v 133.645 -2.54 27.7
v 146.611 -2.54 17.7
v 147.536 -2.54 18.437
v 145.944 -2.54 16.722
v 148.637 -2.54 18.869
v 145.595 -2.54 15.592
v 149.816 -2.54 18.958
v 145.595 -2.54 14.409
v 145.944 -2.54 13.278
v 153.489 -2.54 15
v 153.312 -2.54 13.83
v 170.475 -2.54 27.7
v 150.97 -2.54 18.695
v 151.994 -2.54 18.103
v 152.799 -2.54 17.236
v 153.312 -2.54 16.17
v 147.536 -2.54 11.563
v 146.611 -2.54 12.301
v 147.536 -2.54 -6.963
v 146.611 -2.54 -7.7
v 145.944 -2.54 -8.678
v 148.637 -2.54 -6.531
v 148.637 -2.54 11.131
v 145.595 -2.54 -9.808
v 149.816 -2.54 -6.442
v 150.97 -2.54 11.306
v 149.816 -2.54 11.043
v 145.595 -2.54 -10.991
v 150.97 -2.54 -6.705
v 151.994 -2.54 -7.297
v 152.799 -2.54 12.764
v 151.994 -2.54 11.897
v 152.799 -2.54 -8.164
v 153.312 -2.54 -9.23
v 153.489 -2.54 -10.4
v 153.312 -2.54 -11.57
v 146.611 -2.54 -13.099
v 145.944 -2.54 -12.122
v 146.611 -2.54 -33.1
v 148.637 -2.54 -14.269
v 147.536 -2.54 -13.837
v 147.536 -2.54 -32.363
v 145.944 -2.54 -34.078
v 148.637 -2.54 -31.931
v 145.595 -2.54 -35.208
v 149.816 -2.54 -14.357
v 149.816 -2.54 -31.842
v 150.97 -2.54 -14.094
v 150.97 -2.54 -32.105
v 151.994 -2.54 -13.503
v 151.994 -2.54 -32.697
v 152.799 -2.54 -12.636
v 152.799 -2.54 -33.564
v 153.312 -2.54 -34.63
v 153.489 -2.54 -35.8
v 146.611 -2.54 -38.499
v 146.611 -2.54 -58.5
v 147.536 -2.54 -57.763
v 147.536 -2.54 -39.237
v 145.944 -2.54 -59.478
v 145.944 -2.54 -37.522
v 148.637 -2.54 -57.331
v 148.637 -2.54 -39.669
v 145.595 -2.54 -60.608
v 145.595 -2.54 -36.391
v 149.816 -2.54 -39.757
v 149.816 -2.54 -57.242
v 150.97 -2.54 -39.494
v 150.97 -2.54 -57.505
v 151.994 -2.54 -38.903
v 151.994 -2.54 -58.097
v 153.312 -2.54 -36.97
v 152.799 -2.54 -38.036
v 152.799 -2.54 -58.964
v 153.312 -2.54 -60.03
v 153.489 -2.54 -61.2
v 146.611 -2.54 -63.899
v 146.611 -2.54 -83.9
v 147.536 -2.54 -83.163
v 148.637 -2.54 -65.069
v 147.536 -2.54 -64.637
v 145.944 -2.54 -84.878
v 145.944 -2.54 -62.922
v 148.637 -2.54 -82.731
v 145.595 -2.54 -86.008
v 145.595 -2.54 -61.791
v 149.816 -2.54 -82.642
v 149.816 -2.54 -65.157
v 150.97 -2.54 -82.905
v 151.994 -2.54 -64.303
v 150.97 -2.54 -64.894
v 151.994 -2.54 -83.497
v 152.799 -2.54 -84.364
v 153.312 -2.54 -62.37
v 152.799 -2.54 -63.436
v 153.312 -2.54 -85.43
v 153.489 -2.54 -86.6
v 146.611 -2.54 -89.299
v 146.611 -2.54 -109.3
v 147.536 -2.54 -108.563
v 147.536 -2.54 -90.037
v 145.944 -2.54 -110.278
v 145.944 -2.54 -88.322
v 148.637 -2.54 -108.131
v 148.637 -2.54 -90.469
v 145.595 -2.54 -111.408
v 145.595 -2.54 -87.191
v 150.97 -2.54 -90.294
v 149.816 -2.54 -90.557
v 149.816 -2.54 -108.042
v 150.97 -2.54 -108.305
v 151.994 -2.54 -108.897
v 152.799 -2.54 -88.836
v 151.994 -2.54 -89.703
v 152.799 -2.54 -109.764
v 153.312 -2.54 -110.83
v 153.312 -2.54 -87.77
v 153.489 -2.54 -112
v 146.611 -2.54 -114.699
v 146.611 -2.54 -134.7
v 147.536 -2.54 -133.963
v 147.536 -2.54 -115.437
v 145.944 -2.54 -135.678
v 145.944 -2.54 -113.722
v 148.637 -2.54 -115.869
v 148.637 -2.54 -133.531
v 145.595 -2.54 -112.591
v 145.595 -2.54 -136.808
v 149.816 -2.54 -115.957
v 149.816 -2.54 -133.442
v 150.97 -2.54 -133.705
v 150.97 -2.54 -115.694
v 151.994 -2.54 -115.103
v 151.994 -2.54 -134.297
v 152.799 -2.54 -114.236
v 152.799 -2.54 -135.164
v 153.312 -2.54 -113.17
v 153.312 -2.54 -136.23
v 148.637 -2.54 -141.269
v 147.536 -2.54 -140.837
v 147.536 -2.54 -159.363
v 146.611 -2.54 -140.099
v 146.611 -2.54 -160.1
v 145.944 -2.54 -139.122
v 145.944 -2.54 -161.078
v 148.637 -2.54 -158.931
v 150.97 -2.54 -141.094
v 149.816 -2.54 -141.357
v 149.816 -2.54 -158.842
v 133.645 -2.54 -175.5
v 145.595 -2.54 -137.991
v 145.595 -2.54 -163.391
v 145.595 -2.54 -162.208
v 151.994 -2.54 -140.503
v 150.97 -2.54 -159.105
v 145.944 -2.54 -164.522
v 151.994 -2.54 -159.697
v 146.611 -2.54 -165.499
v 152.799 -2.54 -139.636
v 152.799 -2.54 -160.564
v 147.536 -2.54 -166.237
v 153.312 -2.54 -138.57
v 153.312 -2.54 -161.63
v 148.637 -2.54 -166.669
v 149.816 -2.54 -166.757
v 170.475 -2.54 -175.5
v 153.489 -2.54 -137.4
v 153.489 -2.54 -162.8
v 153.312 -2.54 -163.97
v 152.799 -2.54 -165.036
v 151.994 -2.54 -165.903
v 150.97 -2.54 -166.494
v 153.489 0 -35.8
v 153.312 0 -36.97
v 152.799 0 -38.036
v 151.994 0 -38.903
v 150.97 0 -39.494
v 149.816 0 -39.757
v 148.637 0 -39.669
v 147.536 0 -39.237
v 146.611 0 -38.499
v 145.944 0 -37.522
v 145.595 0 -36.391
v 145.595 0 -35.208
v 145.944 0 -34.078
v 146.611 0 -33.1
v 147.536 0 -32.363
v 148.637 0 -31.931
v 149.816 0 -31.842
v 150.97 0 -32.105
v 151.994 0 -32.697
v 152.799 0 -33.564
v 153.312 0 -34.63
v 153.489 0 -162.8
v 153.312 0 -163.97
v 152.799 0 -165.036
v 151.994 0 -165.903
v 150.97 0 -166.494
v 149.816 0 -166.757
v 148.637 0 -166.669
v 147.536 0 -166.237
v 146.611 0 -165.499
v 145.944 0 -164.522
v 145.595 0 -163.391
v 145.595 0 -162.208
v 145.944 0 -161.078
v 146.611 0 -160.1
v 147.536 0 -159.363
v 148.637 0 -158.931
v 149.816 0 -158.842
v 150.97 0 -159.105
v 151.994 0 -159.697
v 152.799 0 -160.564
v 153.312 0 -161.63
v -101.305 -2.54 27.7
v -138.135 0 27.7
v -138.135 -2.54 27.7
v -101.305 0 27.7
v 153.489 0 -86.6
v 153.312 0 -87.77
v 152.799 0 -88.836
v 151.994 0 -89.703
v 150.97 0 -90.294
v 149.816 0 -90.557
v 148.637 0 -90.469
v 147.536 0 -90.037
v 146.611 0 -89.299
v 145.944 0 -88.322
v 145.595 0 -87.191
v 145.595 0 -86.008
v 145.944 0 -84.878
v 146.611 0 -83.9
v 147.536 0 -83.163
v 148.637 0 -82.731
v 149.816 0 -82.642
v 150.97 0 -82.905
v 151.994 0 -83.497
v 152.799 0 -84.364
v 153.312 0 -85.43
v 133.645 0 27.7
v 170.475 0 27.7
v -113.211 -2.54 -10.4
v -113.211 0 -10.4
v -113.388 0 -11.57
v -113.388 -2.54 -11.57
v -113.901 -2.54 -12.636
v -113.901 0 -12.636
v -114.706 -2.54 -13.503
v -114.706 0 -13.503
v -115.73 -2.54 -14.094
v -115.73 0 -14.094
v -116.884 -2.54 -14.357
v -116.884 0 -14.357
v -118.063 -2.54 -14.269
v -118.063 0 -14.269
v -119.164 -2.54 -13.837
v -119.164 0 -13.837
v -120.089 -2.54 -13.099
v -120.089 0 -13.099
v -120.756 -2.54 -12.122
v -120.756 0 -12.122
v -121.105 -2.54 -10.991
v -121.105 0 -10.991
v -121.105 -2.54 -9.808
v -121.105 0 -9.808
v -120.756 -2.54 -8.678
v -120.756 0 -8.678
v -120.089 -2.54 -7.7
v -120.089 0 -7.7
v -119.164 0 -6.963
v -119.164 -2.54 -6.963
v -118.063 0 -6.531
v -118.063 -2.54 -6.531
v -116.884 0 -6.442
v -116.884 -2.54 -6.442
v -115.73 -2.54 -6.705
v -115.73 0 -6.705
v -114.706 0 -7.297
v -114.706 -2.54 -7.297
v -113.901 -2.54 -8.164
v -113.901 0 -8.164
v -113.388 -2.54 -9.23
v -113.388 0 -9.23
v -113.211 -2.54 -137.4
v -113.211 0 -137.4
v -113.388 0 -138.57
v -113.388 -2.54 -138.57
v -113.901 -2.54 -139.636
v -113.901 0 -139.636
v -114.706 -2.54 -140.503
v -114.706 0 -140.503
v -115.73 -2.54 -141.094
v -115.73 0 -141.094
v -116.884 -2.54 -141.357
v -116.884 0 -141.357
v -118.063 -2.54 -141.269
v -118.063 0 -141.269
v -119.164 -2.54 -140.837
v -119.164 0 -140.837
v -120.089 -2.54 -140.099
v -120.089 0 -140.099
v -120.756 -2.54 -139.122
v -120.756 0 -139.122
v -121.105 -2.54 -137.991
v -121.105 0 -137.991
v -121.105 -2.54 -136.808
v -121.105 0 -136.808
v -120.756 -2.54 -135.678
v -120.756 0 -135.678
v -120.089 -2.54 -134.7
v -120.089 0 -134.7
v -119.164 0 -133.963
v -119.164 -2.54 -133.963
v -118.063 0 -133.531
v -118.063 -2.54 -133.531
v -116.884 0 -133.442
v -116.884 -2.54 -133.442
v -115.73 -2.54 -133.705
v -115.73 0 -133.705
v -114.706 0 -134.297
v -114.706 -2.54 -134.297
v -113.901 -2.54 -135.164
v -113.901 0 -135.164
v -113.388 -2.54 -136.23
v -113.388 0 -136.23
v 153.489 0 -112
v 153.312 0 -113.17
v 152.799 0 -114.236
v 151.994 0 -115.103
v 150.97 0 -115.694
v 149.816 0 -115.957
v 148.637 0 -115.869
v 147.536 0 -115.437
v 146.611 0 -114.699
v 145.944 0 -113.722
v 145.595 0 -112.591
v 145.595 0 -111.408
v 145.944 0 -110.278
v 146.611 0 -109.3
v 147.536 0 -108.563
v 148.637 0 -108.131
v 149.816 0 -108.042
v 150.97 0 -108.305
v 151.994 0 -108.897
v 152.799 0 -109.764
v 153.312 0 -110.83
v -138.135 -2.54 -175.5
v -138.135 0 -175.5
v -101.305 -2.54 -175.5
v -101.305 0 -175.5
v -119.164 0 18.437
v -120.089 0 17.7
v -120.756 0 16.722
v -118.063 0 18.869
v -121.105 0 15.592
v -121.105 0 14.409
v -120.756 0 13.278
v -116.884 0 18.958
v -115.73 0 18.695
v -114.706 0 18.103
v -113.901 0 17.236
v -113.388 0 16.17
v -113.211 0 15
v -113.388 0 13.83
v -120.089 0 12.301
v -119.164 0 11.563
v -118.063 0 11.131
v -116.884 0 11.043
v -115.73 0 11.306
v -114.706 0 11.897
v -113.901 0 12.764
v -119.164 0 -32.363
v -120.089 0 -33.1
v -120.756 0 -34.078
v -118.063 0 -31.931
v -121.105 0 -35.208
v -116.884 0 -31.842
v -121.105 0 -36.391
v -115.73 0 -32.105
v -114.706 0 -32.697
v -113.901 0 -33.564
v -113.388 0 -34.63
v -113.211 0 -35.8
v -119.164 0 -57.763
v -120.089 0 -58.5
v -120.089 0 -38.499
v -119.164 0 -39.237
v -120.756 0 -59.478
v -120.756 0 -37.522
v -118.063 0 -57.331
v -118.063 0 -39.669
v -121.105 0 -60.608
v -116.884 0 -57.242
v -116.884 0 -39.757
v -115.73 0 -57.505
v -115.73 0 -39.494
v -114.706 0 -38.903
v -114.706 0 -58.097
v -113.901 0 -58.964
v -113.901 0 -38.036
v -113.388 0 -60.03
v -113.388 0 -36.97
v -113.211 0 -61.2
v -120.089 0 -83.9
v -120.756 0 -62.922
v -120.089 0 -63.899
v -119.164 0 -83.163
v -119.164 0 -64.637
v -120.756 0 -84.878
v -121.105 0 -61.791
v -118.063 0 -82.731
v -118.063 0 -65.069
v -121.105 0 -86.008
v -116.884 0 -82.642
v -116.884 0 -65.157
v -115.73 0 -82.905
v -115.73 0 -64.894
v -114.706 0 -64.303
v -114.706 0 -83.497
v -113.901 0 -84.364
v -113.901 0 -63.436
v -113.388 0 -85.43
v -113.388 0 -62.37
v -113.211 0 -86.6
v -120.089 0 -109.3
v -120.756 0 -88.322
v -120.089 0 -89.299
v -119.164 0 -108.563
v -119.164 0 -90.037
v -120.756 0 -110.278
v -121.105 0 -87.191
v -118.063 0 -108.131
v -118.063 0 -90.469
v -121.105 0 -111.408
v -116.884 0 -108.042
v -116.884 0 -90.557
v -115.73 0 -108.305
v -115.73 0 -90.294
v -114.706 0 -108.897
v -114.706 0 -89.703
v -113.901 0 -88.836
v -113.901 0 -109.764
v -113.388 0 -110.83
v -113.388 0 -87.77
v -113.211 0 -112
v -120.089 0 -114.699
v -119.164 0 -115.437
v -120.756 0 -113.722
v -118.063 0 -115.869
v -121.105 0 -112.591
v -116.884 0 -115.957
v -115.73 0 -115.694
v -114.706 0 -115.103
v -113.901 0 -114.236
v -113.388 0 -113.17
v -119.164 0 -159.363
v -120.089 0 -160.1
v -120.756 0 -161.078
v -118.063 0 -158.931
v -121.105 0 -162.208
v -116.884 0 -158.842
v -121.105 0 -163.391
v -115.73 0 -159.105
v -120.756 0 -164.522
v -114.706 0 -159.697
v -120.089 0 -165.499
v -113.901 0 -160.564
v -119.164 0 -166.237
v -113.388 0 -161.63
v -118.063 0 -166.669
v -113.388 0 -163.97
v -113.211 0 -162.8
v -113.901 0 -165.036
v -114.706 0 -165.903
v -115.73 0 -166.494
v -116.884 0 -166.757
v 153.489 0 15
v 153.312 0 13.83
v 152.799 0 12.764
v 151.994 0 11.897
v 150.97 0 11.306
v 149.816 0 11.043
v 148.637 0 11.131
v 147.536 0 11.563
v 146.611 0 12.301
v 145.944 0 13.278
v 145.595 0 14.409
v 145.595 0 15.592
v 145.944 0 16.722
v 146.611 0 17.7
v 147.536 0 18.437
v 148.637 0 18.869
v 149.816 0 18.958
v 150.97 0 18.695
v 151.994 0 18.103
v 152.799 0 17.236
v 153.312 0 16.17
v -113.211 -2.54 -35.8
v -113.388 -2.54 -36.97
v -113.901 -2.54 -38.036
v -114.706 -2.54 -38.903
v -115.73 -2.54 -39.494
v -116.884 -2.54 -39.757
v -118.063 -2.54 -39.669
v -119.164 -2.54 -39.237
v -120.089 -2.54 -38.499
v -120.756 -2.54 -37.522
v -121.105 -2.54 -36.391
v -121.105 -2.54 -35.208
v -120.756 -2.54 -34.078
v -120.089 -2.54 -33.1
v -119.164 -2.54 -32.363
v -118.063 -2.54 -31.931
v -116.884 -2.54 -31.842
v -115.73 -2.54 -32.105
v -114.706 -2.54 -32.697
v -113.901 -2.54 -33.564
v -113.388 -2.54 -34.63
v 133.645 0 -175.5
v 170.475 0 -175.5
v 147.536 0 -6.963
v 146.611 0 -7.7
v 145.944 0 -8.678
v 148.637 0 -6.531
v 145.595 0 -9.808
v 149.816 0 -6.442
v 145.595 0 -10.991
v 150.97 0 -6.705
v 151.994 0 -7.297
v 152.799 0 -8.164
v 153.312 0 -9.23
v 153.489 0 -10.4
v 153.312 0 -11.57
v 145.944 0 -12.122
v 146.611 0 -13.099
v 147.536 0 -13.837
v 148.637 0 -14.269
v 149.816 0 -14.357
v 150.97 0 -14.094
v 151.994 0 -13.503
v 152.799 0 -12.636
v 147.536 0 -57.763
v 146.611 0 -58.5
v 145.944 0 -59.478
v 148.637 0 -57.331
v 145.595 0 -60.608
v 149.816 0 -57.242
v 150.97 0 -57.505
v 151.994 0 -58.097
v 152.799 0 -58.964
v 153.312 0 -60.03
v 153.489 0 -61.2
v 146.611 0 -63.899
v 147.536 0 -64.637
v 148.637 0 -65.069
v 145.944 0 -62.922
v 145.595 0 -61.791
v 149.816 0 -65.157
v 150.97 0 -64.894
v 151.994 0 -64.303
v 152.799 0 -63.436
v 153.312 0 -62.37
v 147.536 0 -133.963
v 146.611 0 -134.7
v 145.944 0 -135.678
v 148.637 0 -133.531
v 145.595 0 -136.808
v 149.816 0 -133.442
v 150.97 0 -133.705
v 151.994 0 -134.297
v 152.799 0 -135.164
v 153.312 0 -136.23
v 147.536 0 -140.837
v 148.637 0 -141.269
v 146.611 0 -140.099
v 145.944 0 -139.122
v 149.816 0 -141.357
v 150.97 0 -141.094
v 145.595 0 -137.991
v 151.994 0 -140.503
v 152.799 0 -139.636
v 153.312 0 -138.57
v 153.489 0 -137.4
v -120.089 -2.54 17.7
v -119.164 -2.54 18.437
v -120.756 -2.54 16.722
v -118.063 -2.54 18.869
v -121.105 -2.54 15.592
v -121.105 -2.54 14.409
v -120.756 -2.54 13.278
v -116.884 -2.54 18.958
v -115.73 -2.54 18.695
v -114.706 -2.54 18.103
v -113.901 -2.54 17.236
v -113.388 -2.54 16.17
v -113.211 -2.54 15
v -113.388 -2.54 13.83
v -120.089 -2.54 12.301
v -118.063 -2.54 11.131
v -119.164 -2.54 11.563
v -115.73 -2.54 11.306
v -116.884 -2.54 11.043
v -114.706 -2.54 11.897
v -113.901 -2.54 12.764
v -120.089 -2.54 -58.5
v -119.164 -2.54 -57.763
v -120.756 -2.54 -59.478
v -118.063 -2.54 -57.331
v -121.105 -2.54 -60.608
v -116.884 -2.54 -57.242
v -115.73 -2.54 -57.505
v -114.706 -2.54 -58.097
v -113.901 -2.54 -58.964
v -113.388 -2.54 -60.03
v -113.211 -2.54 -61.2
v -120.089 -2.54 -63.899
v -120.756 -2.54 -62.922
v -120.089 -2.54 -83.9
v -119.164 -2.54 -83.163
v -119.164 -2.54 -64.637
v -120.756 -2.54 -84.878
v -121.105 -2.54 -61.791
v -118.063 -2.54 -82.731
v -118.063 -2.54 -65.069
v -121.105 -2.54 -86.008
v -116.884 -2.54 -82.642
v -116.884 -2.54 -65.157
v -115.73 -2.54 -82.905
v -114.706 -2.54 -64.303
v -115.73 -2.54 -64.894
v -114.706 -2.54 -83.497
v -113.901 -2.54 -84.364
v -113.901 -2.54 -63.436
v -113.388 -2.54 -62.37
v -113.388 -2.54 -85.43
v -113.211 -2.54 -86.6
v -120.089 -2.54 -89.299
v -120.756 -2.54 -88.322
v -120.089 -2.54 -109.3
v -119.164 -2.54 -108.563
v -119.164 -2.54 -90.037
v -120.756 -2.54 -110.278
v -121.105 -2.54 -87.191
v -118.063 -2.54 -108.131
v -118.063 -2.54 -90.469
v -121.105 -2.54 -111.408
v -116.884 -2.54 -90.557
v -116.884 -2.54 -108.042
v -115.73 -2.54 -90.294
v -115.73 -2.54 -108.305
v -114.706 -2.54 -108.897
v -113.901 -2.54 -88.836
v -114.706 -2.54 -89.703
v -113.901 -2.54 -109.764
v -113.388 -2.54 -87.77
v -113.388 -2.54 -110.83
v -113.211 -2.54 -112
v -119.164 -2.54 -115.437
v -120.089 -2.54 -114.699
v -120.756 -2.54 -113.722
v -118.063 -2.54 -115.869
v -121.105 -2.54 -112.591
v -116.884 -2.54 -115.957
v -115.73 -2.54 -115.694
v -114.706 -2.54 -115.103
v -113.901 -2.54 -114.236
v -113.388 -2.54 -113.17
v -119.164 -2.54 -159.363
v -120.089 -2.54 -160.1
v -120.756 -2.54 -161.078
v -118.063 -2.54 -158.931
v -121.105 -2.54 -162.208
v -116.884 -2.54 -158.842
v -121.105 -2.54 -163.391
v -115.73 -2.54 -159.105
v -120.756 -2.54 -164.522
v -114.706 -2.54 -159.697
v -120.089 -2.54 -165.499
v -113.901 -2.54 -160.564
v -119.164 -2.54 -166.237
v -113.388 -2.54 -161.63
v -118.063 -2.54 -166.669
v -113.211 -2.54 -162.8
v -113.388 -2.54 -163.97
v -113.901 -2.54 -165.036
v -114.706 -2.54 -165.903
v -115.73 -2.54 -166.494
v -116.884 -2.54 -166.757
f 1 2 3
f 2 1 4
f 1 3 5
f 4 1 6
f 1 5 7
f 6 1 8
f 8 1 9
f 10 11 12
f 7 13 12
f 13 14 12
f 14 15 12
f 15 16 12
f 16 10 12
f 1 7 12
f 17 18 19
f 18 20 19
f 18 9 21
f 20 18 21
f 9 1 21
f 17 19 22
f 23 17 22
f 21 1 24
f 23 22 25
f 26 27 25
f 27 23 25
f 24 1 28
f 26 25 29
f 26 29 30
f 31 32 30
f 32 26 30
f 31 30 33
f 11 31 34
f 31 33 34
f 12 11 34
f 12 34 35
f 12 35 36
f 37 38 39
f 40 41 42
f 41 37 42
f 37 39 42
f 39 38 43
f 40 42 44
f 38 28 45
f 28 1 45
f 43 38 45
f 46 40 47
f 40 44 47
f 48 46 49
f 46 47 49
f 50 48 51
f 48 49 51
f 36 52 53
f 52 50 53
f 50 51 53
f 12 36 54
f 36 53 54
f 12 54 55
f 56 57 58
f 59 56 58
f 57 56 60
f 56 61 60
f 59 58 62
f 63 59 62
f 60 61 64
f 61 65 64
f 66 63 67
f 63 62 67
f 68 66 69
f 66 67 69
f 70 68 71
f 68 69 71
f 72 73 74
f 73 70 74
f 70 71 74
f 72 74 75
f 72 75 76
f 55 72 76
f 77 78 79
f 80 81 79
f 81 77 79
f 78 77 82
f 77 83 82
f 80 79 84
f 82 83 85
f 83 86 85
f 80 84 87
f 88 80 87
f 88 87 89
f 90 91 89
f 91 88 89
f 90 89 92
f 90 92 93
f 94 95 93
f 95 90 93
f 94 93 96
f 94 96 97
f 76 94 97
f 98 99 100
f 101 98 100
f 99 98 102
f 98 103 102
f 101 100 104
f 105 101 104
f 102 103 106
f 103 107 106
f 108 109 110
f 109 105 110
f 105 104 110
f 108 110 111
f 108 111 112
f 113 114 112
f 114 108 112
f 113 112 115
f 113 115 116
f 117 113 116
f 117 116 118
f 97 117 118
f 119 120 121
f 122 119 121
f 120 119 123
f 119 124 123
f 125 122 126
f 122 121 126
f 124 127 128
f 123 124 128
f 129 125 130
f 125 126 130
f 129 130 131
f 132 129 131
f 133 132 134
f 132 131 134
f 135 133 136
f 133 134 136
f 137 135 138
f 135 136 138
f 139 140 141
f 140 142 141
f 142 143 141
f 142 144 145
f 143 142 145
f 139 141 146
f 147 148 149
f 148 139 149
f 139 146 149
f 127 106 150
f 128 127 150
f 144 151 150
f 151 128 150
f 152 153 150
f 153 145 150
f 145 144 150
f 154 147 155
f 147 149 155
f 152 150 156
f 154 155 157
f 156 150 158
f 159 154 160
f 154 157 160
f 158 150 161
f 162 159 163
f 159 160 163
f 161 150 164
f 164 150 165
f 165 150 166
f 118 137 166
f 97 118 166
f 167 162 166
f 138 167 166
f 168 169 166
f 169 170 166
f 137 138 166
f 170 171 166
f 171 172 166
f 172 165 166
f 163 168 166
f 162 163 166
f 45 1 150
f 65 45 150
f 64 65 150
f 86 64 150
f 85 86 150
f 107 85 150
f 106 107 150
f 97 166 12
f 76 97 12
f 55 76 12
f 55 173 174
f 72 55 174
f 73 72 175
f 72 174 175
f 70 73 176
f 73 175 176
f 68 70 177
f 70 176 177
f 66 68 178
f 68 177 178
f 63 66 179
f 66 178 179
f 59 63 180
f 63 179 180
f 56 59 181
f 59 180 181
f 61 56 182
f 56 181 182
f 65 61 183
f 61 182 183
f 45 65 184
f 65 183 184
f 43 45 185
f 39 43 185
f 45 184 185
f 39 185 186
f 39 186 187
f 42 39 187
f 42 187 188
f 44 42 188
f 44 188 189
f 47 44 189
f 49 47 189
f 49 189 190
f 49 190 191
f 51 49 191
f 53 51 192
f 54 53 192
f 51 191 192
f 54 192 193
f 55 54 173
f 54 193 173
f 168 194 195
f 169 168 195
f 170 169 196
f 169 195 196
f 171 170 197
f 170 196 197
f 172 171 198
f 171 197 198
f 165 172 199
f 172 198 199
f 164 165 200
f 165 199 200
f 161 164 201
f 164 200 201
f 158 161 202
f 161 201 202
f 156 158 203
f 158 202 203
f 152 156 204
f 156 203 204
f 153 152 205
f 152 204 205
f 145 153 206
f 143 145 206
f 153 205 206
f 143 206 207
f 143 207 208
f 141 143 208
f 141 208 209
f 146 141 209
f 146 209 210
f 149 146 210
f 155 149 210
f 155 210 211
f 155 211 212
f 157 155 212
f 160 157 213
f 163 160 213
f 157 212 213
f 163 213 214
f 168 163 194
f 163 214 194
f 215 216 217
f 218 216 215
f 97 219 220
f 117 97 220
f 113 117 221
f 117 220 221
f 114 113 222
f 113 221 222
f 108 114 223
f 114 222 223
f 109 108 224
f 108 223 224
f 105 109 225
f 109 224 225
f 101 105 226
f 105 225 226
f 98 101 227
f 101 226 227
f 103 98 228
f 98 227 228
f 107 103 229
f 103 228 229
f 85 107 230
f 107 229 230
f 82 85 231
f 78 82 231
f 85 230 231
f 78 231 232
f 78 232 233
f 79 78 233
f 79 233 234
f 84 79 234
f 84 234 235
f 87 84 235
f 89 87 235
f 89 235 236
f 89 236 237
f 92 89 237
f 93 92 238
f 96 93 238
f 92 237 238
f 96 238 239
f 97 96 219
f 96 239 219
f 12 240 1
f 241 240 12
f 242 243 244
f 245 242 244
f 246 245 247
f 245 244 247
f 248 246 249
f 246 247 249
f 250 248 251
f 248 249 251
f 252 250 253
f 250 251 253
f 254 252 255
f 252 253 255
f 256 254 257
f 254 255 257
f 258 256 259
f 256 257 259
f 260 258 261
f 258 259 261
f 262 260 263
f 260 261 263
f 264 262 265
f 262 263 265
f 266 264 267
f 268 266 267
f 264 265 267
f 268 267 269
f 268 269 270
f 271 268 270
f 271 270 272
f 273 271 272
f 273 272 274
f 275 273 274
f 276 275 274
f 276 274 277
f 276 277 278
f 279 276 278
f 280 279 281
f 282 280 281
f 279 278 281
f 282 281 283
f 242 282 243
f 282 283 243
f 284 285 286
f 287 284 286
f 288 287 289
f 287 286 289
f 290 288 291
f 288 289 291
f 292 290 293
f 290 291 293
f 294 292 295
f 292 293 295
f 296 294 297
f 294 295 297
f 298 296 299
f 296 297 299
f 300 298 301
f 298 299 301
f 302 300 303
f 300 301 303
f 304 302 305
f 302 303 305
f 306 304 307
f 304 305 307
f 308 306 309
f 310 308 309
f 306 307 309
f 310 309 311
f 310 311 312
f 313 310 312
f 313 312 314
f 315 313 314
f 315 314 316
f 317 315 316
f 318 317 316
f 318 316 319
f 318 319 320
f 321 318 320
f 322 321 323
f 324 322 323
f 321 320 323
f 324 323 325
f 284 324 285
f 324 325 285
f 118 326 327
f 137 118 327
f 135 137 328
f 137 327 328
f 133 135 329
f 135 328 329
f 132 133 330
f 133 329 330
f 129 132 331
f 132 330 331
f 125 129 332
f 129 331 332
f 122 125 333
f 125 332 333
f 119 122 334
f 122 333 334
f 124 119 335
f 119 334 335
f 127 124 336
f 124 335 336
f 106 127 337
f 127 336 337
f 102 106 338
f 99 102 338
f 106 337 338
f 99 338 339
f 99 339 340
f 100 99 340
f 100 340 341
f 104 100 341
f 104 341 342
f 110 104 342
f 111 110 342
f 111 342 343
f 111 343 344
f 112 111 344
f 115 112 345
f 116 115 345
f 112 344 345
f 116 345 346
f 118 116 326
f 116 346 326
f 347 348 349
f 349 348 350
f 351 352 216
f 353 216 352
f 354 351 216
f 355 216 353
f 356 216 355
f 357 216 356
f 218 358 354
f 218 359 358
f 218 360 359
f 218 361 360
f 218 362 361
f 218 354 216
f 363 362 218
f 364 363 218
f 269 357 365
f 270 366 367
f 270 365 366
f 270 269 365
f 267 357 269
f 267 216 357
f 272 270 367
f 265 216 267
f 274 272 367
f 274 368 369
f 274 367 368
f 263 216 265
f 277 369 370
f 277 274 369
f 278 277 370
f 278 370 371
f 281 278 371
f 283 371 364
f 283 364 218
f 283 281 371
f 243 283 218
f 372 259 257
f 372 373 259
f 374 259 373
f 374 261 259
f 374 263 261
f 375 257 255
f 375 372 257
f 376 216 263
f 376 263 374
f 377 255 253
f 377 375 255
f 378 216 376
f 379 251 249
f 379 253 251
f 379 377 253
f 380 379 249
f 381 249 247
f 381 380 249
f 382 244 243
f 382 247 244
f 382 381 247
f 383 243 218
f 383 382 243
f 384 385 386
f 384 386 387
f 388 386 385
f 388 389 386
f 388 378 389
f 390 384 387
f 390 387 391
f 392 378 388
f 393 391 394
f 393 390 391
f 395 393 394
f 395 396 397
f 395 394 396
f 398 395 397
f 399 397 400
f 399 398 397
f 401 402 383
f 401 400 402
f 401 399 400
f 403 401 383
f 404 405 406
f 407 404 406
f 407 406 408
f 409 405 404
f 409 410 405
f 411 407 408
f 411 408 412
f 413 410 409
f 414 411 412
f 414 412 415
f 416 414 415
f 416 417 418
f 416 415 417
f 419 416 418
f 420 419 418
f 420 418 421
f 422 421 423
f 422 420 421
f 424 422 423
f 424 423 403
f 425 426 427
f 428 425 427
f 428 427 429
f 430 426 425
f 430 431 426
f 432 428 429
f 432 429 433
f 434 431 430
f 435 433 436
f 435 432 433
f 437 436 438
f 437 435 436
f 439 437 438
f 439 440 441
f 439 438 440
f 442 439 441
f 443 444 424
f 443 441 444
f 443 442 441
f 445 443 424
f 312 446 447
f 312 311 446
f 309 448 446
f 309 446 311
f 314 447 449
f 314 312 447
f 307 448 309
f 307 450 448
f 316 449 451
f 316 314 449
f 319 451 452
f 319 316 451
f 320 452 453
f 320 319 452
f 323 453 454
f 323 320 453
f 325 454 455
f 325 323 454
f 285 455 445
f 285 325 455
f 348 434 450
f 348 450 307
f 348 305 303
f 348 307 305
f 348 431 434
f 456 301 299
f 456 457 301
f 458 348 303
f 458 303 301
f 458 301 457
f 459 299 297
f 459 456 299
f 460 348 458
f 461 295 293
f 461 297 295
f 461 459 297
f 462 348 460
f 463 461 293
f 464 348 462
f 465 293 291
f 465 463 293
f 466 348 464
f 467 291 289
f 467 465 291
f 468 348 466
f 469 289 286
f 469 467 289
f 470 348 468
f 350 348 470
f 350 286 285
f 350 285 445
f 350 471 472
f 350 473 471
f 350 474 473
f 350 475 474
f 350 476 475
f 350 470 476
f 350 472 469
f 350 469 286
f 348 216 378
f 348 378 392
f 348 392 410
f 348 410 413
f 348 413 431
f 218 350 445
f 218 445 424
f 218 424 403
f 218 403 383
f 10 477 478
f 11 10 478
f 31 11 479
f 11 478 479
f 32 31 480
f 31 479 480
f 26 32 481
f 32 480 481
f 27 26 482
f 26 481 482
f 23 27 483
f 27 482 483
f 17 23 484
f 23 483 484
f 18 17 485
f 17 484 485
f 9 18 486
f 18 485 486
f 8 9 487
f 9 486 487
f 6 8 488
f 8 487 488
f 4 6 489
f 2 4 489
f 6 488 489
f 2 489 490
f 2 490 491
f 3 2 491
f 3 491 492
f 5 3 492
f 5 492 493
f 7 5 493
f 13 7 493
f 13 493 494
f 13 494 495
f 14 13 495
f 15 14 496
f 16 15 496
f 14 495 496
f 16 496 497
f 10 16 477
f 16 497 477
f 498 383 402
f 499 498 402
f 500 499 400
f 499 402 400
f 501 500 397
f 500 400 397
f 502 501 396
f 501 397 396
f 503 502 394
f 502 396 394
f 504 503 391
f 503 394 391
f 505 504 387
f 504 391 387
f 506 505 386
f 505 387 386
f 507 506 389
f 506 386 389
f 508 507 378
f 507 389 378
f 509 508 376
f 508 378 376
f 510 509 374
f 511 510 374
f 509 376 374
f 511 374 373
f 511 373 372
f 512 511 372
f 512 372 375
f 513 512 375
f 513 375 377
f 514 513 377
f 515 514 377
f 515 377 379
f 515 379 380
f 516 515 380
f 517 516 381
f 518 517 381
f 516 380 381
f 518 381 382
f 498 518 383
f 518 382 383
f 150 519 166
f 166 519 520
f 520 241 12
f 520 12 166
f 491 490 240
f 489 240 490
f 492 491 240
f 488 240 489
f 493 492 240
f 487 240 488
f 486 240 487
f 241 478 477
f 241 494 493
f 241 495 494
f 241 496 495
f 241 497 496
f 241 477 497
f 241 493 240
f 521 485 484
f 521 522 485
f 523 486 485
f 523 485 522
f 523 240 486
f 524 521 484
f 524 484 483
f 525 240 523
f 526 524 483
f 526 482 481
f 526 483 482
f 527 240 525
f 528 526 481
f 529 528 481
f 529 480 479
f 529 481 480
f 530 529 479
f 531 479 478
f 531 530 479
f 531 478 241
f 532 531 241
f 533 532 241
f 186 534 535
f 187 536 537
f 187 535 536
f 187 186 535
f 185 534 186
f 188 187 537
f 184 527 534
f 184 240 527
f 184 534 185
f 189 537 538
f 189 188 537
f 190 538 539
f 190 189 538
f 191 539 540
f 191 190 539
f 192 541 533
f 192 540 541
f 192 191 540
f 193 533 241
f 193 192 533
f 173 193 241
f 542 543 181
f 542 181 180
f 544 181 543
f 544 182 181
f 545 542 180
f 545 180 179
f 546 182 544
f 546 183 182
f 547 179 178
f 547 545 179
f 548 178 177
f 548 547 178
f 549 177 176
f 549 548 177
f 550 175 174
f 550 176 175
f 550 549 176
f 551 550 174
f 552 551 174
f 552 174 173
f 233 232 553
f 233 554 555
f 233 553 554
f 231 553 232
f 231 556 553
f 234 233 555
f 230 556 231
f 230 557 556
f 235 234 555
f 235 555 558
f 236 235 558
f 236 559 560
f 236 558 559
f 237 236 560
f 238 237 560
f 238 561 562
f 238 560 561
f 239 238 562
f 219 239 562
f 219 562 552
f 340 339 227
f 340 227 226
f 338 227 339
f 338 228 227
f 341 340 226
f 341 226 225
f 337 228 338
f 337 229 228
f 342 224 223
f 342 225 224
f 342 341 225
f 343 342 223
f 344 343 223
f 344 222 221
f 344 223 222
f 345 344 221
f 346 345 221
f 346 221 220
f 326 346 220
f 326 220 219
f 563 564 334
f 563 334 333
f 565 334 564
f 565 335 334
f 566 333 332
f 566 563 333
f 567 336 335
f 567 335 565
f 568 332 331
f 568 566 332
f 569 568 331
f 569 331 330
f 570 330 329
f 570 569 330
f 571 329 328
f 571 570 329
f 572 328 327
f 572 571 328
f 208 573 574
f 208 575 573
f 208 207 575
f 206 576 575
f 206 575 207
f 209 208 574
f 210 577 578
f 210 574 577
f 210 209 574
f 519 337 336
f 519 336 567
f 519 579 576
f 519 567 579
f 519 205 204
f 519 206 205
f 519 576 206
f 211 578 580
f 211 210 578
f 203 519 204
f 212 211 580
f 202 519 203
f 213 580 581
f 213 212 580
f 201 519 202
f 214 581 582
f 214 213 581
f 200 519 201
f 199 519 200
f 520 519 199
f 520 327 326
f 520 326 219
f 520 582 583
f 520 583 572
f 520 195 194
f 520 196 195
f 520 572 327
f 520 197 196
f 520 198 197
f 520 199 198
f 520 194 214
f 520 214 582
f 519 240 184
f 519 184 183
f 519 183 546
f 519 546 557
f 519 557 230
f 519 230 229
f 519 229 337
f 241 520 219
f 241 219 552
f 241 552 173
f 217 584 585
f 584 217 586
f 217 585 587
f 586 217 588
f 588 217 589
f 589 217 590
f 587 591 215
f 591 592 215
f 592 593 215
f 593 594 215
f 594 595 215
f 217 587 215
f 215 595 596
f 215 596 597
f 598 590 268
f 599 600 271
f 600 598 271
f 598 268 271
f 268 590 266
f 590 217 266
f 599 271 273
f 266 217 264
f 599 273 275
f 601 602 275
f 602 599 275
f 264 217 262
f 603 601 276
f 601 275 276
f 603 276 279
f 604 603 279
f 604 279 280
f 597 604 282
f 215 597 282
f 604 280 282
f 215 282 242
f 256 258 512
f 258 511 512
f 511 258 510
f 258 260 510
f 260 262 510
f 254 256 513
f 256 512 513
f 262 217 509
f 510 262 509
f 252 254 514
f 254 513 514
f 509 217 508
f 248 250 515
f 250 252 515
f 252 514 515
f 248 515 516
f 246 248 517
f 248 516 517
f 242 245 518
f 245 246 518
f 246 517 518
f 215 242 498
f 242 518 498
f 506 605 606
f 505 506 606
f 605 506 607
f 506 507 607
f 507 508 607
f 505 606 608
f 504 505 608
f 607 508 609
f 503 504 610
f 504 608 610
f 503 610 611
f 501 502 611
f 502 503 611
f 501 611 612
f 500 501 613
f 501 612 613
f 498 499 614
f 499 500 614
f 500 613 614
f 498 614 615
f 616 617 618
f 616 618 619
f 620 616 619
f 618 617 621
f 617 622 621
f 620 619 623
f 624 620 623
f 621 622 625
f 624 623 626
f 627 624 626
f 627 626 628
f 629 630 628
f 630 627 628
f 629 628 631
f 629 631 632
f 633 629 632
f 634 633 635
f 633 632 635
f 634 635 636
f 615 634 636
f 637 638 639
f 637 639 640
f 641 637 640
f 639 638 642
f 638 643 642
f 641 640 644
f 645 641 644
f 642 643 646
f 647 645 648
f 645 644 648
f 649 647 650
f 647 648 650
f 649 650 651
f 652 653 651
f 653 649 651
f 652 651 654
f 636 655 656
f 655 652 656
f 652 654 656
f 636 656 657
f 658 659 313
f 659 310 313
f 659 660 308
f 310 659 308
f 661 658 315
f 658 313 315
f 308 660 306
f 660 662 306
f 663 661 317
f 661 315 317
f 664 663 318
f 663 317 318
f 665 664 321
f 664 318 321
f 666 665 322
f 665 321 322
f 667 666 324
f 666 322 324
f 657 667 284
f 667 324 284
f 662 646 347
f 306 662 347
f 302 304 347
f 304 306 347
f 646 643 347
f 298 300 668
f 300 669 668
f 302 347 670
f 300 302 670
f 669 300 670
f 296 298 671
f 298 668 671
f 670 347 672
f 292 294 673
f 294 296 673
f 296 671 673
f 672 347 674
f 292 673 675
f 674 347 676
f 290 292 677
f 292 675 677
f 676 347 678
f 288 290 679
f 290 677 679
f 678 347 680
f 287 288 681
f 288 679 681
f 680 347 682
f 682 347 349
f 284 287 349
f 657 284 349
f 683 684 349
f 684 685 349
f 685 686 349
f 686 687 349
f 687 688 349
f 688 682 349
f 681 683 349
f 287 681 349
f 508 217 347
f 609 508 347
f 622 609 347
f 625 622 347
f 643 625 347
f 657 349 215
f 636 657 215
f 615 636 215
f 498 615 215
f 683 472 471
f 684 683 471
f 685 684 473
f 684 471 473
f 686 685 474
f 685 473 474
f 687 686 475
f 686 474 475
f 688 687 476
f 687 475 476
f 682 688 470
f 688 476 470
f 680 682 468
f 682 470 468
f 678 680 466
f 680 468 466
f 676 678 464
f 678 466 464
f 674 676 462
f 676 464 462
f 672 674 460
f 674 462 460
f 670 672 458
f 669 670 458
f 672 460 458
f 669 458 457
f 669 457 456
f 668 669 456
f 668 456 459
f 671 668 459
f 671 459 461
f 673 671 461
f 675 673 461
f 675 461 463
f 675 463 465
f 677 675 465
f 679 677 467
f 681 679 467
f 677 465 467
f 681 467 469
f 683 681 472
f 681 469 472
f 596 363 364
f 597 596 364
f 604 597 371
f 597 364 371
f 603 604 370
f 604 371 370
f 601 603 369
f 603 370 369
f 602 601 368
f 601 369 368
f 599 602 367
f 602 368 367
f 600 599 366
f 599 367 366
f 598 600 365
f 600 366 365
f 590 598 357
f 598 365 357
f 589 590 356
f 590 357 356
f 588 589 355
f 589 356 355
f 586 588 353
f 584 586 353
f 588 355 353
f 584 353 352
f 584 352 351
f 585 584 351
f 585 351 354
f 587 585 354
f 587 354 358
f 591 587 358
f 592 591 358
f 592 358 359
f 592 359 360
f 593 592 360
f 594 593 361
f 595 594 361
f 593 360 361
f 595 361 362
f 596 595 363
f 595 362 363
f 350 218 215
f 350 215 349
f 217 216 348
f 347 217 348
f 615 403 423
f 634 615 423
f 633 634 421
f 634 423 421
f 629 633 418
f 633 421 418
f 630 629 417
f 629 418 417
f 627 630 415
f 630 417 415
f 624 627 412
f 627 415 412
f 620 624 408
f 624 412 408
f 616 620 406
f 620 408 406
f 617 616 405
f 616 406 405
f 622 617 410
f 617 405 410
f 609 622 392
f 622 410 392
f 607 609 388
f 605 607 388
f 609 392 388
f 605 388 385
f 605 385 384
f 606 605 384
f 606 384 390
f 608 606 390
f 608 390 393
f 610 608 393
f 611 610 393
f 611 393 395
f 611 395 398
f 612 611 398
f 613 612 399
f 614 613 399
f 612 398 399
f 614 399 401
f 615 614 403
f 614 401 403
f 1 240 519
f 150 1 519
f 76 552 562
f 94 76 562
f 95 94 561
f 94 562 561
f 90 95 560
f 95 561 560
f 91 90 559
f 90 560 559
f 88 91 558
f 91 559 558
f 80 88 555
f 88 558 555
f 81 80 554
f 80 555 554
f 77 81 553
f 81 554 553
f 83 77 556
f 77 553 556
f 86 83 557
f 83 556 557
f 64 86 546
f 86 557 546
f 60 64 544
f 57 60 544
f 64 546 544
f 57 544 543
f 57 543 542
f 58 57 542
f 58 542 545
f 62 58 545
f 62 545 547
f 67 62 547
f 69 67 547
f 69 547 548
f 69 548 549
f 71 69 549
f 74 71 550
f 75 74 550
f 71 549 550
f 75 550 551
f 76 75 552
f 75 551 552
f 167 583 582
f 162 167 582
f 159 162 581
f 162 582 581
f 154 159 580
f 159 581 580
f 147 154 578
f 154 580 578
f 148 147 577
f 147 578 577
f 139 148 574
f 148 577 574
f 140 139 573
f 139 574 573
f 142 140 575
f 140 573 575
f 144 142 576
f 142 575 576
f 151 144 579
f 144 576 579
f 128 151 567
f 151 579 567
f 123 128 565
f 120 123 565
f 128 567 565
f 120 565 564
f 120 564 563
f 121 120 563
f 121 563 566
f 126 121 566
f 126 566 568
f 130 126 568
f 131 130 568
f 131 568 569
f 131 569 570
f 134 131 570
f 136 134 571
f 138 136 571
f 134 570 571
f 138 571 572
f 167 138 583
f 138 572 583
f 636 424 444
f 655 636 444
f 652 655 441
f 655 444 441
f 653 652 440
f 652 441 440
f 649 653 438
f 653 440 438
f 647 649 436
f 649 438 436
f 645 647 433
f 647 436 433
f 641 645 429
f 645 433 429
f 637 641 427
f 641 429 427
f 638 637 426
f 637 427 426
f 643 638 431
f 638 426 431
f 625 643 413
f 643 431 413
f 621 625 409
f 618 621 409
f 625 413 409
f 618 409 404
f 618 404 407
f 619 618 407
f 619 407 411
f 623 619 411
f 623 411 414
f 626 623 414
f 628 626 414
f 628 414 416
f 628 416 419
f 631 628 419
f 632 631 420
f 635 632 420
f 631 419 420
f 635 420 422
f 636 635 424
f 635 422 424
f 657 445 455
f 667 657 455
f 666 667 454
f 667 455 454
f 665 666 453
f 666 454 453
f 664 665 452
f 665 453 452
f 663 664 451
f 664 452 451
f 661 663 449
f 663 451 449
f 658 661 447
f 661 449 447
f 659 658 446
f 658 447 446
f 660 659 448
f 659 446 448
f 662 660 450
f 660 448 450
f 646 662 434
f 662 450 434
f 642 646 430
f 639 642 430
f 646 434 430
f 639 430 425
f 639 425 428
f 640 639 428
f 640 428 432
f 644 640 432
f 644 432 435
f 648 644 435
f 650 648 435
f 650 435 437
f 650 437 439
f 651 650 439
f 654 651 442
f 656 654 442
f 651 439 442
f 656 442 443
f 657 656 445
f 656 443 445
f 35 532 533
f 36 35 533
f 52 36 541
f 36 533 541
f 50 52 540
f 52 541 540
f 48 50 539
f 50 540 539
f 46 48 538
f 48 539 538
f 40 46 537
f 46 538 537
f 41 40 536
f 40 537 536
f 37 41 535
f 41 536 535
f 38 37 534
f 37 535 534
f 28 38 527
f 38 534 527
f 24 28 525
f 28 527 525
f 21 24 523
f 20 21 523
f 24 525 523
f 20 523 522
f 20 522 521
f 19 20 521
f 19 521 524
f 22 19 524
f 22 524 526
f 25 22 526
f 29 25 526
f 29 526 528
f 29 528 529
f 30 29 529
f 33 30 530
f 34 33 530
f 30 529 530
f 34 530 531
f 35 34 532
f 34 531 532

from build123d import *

# Parameters (mm, degrees)
SKETCH1_W             = 36.83
SKETCH1_H             = 203.2
BOSS_EXTRUDE1_DEPTH   = 2.54
BOSS_EXTRUDE1_2_DEPTH = 2.54
SKETCH2_R             = 3.96875
CUT_EXTRUDE1_DEPTH    = 2.54


with BuildPart() as part:
    # Sketch1 → Boss-Extrude1 (new body)
    with BuildSketch(Plane(origin=(0, 0, 0), x_dir=(1, 0, 0), z_dir=(0, 1, 0))):
        with Locations((-119.720108359, 73.899845201)):
            Rectangle(SKETCH1_W, SKETCH1_H)
    extrude(amount=-BOSS_EXTRUDE1_DEPTH)


with BuildPart() as body_2:
    # Sketch1 → Boss-Extrude1 2 (new body)
    with BuildSketch(Plane(origin=(0, 0, 0), x_dir=(1, 0, 0), z_dir=(0, 1, 0))):
        with Locations((152.059891641, 73.899845201)):
            Rectangle(SKETCH1_W, SKETCH1_H)
    extrude(amount=-BOSS_EXTRUDE1_2_DEPTH)


with BuildPart() as cut_extrude1_tool:
    # Sketch2 → Cut-Extrude1 (new body)
    with BuildSketch(Plane(origin=(0, 0, 0), x_dir=(1, 0, 0), z_dir=(0, 1, 0))):
        with Locations((-117.180108359, 162.799845201)):
            Circle(SKETCH2_R)
        with Locations((-117.180108359, 137.399845201)):
            Circle(SKETCH2_R)
        with Locations((-117.180108359, 111.999845201)):
            Circle(SKETCH2_R)
        with Locations((-117.180108359, 86.599845201)):
            Circle(SKETCH2_R)
        with Locations((-117.180108359, 61.199845201)):
            Circle(SKETCH2_R)
        with Locations((-117.180108359, 35.799845201)):
            Circle(SKETCH2_R)
        with Locations((-117.180108359, 10.399845201)):
            Circle(SKETCH2_R)
        with Locations((-117.180108359, -15.000154799)):
            Circle(SKETCH2_R)
        with Locations((149.519891641, -15.000154799)):
            Circle(SKETCH2_R)
        with Locations((149.519891641, 10.399845201)):
            Circle(SKETCH2_R)
        with Locations((149.519891641, 35.799845201)):
            Circle(SKETCH2_R)
        with Locations((149.519891641, 61.199845201)):
            Circle(SKETCH2_R)
        with Locations((149.519891641, 86.599845201)):
            Circle(SKETCH2_R)
        with Locations((149.519891641, 111.999845201)):
            Circle(SKETCH2_R)
        with Locations((149.519891641, 137.399845201)):
            Circle(SKETCH2_R)
        with Locations((149.519891641, 162.799845201)):
            Circle(SKETCH2_R)
    extrude(amount=-CUT_EXTRUDE1_DEPTH)


with BuildPart() as part_1:
    add(part.part)

    # Cut-Extrude1: cut by cut_extrude1_tool
    add(cut_extrude1_tool.part, mode=Mode.SUBTRACT)


with BuildPart() as body_2_1:
    add(body_2.part)

    # Cut-Extrude1: cut by cut_extrude1_tool
    add(cut_extrude1_tool.part, mode=Mode.SUBTRACT)


solid = Compound([part_1.part, body_2_1.part])
